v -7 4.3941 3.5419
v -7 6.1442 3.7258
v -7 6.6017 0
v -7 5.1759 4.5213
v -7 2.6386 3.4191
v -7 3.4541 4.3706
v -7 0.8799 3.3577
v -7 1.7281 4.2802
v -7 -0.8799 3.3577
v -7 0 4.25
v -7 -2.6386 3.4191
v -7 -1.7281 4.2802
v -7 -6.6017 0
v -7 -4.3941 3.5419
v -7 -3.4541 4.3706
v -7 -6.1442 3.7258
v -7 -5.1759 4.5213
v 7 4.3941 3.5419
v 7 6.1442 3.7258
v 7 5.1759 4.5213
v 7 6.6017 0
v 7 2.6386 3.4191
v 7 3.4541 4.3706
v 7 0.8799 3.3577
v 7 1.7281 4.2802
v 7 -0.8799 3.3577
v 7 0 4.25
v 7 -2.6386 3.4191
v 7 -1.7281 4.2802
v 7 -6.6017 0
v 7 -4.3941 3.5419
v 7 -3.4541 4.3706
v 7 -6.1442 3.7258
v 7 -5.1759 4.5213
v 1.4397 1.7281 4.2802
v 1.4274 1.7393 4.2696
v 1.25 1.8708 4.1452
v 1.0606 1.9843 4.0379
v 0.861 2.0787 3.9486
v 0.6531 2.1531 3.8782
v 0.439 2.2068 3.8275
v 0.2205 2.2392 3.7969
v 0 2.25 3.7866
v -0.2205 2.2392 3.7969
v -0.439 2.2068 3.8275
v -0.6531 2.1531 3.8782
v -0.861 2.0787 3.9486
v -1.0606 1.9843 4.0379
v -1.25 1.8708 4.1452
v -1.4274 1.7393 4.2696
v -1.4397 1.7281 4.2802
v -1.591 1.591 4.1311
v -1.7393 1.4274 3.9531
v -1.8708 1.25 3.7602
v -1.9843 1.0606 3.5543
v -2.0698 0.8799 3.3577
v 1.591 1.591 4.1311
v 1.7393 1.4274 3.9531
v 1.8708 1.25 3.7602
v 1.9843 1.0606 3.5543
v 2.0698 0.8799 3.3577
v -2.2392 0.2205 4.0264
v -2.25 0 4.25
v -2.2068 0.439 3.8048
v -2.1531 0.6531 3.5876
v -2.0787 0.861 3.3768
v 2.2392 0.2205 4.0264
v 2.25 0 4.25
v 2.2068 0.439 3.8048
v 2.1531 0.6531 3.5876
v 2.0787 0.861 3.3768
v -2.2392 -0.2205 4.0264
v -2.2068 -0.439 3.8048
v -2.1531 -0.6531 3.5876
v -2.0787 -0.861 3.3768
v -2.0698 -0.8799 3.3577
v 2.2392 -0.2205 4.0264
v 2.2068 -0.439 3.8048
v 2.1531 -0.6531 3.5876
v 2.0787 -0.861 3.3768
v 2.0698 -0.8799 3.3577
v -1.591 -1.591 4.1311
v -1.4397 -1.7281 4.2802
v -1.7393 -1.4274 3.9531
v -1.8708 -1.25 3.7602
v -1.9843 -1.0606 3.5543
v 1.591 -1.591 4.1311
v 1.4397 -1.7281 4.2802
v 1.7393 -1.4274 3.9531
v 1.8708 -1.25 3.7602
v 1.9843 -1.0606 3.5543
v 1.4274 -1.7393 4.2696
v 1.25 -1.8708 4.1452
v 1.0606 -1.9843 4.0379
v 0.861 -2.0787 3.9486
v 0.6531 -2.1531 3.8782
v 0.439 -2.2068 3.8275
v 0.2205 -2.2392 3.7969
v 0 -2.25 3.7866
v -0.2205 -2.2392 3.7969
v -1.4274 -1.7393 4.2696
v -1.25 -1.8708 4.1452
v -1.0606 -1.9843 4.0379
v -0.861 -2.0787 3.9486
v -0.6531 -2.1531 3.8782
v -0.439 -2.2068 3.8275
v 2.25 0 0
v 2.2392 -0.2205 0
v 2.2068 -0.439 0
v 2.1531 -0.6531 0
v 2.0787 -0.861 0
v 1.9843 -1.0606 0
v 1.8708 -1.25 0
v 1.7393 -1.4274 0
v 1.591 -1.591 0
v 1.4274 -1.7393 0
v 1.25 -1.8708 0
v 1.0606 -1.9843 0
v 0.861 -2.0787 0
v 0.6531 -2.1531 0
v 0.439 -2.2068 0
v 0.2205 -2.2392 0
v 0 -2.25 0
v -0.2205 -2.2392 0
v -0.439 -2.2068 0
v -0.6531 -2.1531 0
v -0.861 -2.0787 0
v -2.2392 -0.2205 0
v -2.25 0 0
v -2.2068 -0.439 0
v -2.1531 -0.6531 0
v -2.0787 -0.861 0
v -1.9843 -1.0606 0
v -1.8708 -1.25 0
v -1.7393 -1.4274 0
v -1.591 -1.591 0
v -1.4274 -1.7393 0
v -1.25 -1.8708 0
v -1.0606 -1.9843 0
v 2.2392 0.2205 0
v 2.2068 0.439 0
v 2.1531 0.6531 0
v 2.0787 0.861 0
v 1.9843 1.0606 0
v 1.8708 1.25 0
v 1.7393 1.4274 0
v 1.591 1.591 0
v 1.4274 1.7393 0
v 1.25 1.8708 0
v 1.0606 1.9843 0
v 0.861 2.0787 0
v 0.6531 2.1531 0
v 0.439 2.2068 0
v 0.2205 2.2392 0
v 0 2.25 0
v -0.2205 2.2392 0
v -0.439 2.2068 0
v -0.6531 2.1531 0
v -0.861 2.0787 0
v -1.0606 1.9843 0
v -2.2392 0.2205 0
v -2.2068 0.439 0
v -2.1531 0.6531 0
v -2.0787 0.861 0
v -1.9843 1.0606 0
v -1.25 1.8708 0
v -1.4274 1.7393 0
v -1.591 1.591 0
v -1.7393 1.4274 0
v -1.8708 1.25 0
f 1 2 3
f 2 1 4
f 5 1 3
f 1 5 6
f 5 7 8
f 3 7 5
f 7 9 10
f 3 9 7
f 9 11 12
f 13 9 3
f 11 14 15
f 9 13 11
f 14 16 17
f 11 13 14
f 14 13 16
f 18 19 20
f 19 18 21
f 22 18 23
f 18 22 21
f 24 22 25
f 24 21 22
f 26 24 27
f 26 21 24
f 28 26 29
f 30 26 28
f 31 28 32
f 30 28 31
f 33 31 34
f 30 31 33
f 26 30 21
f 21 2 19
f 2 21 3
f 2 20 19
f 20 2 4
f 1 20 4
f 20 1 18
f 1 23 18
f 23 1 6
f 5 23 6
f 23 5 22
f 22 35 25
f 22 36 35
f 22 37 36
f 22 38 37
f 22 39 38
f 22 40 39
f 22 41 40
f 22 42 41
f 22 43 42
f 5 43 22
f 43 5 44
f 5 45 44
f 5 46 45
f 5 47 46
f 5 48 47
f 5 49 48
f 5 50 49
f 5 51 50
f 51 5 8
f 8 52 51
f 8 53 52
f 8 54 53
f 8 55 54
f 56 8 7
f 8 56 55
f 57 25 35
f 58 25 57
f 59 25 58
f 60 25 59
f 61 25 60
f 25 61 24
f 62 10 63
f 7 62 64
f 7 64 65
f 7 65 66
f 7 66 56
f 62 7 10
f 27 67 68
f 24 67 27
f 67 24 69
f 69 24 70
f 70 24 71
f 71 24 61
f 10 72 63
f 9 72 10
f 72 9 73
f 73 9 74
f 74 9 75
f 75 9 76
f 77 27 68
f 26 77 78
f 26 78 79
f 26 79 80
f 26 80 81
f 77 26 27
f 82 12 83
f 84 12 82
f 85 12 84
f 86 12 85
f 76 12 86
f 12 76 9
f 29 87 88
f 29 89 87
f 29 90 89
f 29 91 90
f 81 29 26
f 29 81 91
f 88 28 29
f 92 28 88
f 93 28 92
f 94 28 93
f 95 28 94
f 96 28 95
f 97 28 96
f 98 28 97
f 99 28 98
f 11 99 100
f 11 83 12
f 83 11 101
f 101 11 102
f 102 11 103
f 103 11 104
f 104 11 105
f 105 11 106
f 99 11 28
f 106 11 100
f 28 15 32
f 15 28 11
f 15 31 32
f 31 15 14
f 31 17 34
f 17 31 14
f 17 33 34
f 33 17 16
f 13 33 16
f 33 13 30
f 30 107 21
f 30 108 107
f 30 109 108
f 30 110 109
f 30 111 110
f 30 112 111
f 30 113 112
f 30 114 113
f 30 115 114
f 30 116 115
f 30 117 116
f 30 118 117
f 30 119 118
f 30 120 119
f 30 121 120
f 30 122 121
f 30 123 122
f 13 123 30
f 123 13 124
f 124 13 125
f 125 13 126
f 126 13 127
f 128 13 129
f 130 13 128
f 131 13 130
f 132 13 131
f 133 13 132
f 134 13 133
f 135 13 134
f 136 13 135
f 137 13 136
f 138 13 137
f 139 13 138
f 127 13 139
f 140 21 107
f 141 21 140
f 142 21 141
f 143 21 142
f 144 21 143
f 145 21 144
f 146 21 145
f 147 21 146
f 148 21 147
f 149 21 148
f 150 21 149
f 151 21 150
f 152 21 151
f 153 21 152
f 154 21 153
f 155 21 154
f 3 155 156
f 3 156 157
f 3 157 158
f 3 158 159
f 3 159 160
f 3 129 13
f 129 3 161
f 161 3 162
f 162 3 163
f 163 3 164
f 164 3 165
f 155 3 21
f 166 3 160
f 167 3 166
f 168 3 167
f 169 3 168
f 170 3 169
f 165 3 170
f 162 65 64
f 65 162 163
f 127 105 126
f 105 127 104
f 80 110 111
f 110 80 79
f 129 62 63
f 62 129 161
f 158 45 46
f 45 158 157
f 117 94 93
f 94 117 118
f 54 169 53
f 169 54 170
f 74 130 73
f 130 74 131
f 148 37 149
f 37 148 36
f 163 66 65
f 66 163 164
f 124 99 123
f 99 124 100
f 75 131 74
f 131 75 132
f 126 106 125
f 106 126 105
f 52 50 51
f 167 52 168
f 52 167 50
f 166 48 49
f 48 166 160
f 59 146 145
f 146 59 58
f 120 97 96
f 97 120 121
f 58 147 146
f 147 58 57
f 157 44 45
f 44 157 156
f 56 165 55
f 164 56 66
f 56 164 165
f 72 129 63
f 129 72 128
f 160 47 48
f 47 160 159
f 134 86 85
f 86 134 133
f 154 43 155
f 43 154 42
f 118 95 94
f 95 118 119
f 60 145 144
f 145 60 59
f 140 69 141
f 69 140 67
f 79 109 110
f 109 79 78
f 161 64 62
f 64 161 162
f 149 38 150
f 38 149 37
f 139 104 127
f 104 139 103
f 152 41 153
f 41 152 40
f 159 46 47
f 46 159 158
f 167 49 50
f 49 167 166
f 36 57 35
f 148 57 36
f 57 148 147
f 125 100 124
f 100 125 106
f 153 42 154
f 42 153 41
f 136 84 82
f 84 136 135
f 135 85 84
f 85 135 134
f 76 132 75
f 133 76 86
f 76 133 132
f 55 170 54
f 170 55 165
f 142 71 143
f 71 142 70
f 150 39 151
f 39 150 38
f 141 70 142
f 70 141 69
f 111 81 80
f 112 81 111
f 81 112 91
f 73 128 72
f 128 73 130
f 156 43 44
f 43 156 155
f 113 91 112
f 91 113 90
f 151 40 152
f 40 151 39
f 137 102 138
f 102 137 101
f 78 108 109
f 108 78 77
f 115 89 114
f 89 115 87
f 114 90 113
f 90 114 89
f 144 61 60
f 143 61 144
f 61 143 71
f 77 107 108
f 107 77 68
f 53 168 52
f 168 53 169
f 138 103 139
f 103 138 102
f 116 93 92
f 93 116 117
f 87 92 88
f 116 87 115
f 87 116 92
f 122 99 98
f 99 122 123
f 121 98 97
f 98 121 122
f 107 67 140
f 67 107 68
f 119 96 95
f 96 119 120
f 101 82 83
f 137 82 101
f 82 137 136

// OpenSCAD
// file: ../../mount_common.scad
// Fixed measurements shared by every mount option.
// Single owner: these come from the hand sketch (or were fixed by Cat) and must
// be identical in all three models. Change a value here, rebuild, and every
// option follows. Never redefine these in a model file.
//
// Source tags: [written] on the sketch, [scaled] measured off the sketch,
// [fixed] decided by Cat (not on the sketch).

/* [Envelope] */
width  = 55;   // [written] block width / camera face width
height = 110;  // [written]

/* [Ring mounting holes] */
ring_hole_d       = 2.25;  // [written] pilot for the Ring bracket screws
ring_hole_spacing = 91.5;  // [written] centre to centre, vertically centred
ring_hole_depth   = 12;    // [chosen]  measured into the camera face

/* [Wiring pocket] */
pocket_z_min      = 30;    // [written] bottom of pocket above block bottom
pocket_z_max      = 60;    // [written] top of pocket above block bottom
pocket_deep_inset = 9;     // [scaled]  pocket edge to deep side, front view
pocket_width      = 34.3;  // [scaled]  front-view width
pocket_depth      = 15;    // [fixed]   behind the camera plate

/* [Cable hole] */
cable_d          = 8;      // [written]
cable_z          = 35;     // [scaled] centre height
cable_deep_inset = 17;     // [scaled] centre to deep side (where the wire leaves the wall)

/* [Mounting screws] (through the width, into the mounting surface) */
// Size is shared so every option takes the same screws. Their POSITIONS are not
// fixed (Cat, 2026-11-01): each model sets its own screw_y / screw_z.
// Screws: #8 flat (bevel) head wood screws [fixed by Cat]. Sizes per ASME
// B18.6.1 as recalled, not looked up: shank 0.164 in (4.17 mm), head up to
// 0.332 in (8.43 mm), 82 degree head. Measure a real screw to confirm.
screw_d      = 4.6;        // [fixed] clearance for #8 (4.17 mm shank) so it pulls the mount tight
screw_head_d = 8.8;        // [fixed] countersink diameter for the #8 head (8.43 mm max)
screw_sink_angle = 82;     // [fixed] US flat-head angle (metric is 90)
// main file
// Print file: option 2 (adjustable hinge), the toothed washer.
// build.ps1 exports ../stl/washer.stl from this file. Print orientation: Flat face down, teeth up.
//
// To change this one print: uncomment a setting below (or add any value from
// ../option2_hinge.scad), then in OpenSCAD press F6 and use File > Export > STL.
// The last value set wins, so a setting here only affects this print.
//   - Fixed measurements (mount_common.scad) can't be changed here: the build fails.
//   - Print tolerances that two parts share must match, so change those in
//     ../option2_hinge.scad instead. The build warns if one is set here.

include <../option2_hinge.scad>

part = "washer";

// Settings for this print:
// (none specific to this part)
